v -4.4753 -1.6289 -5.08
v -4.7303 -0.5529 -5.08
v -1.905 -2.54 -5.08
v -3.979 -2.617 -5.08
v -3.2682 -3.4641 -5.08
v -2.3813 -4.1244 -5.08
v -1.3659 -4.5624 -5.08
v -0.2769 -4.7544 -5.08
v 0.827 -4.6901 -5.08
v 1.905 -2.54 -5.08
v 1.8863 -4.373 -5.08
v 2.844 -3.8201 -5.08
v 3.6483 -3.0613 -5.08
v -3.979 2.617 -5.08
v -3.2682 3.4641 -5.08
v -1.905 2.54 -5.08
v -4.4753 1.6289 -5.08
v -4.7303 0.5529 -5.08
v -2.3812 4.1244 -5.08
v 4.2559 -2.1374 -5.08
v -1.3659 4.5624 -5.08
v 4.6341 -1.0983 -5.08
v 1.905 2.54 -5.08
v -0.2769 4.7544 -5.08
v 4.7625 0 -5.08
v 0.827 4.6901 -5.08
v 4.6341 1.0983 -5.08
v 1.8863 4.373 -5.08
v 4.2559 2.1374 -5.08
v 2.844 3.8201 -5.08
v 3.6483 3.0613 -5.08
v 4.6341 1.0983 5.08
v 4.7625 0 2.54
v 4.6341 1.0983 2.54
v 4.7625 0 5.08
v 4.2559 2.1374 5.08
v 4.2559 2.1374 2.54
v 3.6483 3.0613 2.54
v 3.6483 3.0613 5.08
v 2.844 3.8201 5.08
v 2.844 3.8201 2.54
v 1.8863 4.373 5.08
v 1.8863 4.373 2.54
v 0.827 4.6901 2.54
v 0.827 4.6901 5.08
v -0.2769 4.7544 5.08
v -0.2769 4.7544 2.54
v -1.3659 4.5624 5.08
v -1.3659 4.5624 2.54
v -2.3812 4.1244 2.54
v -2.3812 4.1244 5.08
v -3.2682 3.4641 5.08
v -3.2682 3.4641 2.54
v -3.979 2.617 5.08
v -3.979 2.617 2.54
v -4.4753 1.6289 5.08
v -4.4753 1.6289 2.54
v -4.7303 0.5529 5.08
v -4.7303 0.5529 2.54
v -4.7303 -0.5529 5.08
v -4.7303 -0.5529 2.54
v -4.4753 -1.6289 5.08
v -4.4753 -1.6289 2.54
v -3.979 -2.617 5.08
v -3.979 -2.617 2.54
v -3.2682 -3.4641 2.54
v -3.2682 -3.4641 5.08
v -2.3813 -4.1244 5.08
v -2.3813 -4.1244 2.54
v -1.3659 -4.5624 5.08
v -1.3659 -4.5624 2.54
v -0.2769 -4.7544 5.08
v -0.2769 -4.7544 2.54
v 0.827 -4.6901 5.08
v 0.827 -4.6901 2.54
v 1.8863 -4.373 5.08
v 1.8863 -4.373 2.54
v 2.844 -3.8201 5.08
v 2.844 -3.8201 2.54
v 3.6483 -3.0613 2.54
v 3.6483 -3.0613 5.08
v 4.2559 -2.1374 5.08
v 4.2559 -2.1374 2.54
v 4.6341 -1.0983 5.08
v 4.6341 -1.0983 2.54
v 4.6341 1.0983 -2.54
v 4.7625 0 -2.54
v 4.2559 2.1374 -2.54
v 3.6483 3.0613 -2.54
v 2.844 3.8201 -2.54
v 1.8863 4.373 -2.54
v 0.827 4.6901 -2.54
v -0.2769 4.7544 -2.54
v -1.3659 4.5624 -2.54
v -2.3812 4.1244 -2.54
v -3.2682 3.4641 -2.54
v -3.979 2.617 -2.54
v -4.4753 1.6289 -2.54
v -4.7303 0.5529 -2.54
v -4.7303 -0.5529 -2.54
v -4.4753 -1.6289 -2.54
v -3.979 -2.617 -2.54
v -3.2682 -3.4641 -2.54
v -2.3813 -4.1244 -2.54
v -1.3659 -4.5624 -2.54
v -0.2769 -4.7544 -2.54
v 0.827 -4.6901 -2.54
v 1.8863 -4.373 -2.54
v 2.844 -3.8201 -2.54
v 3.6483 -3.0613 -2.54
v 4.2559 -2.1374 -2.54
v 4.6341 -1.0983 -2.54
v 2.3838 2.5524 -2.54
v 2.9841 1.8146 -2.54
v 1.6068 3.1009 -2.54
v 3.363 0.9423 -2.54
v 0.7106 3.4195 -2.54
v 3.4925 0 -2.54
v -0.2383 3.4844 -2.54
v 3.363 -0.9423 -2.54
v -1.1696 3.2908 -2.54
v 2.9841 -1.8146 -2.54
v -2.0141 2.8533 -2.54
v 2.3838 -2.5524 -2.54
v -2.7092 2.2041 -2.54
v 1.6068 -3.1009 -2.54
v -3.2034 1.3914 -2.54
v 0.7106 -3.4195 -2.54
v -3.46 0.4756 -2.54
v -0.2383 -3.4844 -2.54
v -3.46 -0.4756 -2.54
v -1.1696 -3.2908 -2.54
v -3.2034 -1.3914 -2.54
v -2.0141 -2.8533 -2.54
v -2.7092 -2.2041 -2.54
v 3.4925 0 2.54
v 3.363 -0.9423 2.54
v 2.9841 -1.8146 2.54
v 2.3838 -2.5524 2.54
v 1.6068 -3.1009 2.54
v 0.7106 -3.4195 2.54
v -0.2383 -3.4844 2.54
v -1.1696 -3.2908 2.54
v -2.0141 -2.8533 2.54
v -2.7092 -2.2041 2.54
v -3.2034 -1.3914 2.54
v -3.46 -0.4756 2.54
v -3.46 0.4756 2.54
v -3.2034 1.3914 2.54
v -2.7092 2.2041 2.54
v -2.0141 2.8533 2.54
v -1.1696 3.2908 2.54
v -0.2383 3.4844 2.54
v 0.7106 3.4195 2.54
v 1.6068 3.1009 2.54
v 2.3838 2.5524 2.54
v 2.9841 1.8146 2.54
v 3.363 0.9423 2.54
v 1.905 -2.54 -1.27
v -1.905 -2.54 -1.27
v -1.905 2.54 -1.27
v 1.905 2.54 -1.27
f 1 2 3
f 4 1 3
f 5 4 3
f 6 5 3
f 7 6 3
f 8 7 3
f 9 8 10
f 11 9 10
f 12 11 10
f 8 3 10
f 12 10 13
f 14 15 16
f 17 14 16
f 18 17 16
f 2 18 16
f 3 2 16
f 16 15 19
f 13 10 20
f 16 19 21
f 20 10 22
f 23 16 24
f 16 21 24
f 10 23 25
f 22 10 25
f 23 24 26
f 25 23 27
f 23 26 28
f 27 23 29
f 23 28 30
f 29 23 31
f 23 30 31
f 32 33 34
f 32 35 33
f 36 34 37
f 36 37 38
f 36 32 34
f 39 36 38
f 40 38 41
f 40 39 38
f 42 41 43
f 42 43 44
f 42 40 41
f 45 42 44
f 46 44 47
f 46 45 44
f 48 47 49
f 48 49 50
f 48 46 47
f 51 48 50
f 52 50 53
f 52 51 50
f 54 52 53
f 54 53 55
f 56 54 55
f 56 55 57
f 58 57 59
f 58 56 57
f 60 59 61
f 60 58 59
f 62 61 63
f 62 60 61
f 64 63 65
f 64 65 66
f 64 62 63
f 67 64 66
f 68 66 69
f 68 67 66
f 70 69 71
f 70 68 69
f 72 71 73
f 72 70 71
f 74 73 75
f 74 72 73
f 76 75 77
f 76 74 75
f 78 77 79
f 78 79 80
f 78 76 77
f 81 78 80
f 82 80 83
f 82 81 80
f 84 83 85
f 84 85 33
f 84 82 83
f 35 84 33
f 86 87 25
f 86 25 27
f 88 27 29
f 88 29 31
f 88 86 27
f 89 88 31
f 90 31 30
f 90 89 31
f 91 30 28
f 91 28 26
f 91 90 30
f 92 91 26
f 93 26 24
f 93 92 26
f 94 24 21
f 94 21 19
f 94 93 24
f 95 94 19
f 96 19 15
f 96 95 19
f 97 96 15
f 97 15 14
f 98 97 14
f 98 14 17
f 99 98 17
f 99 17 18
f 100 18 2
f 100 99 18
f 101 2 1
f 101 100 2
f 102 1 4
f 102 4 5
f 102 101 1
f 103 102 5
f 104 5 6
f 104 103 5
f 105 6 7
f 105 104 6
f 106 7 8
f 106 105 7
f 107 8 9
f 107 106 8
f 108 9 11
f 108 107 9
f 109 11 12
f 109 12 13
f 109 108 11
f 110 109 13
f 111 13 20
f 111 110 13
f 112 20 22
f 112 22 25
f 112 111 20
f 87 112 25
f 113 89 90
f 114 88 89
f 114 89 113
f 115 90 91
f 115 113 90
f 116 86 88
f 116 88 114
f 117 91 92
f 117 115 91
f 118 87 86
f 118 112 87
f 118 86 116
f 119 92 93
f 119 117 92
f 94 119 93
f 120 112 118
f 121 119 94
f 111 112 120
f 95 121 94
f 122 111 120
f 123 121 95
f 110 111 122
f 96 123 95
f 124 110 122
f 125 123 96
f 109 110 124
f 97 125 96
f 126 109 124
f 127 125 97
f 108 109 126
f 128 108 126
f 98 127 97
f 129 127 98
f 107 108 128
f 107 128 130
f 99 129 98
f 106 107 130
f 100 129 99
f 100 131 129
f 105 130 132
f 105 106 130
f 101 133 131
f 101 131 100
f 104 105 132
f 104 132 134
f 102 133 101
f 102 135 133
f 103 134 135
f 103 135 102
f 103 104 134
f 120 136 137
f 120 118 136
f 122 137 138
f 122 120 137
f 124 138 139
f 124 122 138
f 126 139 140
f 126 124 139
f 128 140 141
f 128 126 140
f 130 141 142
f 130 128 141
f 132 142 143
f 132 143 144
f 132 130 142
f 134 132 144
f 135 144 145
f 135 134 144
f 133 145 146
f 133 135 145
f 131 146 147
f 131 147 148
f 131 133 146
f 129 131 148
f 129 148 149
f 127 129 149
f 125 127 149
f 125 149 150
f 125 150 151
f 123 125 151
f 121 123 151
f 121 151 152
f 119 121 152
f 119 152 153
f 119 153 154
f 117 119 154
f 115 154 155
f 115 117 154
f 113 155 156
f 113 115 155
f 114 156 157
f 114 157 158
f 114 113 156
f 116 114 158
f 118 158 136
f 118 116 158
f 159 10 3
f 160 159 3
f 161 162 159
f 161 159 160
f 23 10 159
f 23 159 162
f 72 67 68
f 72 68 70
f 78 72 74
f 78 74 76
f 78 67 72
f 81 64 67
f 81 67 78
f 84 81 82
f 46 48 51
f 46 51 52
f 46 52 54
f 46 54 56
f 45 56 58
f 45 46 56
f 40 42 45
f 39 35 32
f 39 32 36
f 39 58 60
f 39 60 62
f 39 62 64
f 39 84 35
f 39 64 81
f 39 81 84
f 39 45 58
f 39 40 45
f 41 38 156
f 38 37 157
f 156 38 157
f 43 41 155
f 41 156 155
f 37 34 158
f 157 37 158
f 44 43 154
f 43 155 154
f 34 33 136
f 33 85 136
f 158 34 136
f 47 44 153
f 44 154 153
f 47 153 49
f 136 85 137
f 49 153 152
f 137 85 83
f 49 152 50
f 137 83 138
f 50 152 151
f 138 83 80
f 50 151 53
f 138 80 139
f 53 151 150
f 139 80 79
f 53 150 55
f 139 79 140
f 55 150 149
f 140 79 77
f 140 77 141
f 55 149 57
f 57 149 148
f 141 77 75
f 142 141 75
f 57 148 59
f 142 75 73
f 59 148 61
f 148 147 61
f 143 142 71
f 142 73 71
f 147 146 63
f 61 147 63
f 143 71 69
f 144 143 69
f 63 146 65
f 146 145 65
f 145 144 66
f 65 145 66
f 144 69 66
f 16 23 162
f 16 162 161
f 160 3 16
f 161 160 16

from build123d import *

# Parameters (mm, degrees)
SKETCH1_R           = 4.7625
BOSS_EXTRUDE1_DEPTH = 5.08
SKETCH4_W           = 3.81
SKETCH4_H           = 5.08
CUT_EXTRUDE1_DEPTH  = 3.81
SKETCH8_W           = 5.08
SKETCH8_H           = 2.54


with BuildPart() as part:
    # Sketch1 → Boss-Extrude1 (new body, symmetric)
    with BuildSketch(Plane.XY):
        Circle(SKETCH1_R)
    extrude(amount=BOSS_EXTRUDE1_DEPTH, both=True)

    # Sketch4 → Cut-Extrude1 (cut)
    with BuildSketch(Plane(origin=(0, 0, -5.08), x_dir=(-1, 0, 0), z_dir=(0, 0, -1))):
        Rectangle(SKETCH4_W, SKETCH4_H)
    extrude(amount=-CUT_EXTRUDE1_DEPTH, mode=Mode.SUBTRACT)

    # Sketch8 → Cut-Revolve1 (revolve, cut)
    with BuildSketch(Plane(origin=(0, 0, 0), x_dir=(0, 0, -1), z_dir=(1, 0, 0)), mode=Mode.PRIVATE) as cut_revolve1_sk:
        with Locations((0, 4.7625)):
            Rectangle(SKETCH8_W, SKETCH8_H)
    revolve(cut_revolve1_sk.sketch.rotate(Axis((0, 0, 0), (0, 0, -1)), 90), axis=Axis((0, 0, 0), (0, 0, -1)), mode=Mode.SUBTRACT)  # turned: the seam where the file's is


solid = part.part
